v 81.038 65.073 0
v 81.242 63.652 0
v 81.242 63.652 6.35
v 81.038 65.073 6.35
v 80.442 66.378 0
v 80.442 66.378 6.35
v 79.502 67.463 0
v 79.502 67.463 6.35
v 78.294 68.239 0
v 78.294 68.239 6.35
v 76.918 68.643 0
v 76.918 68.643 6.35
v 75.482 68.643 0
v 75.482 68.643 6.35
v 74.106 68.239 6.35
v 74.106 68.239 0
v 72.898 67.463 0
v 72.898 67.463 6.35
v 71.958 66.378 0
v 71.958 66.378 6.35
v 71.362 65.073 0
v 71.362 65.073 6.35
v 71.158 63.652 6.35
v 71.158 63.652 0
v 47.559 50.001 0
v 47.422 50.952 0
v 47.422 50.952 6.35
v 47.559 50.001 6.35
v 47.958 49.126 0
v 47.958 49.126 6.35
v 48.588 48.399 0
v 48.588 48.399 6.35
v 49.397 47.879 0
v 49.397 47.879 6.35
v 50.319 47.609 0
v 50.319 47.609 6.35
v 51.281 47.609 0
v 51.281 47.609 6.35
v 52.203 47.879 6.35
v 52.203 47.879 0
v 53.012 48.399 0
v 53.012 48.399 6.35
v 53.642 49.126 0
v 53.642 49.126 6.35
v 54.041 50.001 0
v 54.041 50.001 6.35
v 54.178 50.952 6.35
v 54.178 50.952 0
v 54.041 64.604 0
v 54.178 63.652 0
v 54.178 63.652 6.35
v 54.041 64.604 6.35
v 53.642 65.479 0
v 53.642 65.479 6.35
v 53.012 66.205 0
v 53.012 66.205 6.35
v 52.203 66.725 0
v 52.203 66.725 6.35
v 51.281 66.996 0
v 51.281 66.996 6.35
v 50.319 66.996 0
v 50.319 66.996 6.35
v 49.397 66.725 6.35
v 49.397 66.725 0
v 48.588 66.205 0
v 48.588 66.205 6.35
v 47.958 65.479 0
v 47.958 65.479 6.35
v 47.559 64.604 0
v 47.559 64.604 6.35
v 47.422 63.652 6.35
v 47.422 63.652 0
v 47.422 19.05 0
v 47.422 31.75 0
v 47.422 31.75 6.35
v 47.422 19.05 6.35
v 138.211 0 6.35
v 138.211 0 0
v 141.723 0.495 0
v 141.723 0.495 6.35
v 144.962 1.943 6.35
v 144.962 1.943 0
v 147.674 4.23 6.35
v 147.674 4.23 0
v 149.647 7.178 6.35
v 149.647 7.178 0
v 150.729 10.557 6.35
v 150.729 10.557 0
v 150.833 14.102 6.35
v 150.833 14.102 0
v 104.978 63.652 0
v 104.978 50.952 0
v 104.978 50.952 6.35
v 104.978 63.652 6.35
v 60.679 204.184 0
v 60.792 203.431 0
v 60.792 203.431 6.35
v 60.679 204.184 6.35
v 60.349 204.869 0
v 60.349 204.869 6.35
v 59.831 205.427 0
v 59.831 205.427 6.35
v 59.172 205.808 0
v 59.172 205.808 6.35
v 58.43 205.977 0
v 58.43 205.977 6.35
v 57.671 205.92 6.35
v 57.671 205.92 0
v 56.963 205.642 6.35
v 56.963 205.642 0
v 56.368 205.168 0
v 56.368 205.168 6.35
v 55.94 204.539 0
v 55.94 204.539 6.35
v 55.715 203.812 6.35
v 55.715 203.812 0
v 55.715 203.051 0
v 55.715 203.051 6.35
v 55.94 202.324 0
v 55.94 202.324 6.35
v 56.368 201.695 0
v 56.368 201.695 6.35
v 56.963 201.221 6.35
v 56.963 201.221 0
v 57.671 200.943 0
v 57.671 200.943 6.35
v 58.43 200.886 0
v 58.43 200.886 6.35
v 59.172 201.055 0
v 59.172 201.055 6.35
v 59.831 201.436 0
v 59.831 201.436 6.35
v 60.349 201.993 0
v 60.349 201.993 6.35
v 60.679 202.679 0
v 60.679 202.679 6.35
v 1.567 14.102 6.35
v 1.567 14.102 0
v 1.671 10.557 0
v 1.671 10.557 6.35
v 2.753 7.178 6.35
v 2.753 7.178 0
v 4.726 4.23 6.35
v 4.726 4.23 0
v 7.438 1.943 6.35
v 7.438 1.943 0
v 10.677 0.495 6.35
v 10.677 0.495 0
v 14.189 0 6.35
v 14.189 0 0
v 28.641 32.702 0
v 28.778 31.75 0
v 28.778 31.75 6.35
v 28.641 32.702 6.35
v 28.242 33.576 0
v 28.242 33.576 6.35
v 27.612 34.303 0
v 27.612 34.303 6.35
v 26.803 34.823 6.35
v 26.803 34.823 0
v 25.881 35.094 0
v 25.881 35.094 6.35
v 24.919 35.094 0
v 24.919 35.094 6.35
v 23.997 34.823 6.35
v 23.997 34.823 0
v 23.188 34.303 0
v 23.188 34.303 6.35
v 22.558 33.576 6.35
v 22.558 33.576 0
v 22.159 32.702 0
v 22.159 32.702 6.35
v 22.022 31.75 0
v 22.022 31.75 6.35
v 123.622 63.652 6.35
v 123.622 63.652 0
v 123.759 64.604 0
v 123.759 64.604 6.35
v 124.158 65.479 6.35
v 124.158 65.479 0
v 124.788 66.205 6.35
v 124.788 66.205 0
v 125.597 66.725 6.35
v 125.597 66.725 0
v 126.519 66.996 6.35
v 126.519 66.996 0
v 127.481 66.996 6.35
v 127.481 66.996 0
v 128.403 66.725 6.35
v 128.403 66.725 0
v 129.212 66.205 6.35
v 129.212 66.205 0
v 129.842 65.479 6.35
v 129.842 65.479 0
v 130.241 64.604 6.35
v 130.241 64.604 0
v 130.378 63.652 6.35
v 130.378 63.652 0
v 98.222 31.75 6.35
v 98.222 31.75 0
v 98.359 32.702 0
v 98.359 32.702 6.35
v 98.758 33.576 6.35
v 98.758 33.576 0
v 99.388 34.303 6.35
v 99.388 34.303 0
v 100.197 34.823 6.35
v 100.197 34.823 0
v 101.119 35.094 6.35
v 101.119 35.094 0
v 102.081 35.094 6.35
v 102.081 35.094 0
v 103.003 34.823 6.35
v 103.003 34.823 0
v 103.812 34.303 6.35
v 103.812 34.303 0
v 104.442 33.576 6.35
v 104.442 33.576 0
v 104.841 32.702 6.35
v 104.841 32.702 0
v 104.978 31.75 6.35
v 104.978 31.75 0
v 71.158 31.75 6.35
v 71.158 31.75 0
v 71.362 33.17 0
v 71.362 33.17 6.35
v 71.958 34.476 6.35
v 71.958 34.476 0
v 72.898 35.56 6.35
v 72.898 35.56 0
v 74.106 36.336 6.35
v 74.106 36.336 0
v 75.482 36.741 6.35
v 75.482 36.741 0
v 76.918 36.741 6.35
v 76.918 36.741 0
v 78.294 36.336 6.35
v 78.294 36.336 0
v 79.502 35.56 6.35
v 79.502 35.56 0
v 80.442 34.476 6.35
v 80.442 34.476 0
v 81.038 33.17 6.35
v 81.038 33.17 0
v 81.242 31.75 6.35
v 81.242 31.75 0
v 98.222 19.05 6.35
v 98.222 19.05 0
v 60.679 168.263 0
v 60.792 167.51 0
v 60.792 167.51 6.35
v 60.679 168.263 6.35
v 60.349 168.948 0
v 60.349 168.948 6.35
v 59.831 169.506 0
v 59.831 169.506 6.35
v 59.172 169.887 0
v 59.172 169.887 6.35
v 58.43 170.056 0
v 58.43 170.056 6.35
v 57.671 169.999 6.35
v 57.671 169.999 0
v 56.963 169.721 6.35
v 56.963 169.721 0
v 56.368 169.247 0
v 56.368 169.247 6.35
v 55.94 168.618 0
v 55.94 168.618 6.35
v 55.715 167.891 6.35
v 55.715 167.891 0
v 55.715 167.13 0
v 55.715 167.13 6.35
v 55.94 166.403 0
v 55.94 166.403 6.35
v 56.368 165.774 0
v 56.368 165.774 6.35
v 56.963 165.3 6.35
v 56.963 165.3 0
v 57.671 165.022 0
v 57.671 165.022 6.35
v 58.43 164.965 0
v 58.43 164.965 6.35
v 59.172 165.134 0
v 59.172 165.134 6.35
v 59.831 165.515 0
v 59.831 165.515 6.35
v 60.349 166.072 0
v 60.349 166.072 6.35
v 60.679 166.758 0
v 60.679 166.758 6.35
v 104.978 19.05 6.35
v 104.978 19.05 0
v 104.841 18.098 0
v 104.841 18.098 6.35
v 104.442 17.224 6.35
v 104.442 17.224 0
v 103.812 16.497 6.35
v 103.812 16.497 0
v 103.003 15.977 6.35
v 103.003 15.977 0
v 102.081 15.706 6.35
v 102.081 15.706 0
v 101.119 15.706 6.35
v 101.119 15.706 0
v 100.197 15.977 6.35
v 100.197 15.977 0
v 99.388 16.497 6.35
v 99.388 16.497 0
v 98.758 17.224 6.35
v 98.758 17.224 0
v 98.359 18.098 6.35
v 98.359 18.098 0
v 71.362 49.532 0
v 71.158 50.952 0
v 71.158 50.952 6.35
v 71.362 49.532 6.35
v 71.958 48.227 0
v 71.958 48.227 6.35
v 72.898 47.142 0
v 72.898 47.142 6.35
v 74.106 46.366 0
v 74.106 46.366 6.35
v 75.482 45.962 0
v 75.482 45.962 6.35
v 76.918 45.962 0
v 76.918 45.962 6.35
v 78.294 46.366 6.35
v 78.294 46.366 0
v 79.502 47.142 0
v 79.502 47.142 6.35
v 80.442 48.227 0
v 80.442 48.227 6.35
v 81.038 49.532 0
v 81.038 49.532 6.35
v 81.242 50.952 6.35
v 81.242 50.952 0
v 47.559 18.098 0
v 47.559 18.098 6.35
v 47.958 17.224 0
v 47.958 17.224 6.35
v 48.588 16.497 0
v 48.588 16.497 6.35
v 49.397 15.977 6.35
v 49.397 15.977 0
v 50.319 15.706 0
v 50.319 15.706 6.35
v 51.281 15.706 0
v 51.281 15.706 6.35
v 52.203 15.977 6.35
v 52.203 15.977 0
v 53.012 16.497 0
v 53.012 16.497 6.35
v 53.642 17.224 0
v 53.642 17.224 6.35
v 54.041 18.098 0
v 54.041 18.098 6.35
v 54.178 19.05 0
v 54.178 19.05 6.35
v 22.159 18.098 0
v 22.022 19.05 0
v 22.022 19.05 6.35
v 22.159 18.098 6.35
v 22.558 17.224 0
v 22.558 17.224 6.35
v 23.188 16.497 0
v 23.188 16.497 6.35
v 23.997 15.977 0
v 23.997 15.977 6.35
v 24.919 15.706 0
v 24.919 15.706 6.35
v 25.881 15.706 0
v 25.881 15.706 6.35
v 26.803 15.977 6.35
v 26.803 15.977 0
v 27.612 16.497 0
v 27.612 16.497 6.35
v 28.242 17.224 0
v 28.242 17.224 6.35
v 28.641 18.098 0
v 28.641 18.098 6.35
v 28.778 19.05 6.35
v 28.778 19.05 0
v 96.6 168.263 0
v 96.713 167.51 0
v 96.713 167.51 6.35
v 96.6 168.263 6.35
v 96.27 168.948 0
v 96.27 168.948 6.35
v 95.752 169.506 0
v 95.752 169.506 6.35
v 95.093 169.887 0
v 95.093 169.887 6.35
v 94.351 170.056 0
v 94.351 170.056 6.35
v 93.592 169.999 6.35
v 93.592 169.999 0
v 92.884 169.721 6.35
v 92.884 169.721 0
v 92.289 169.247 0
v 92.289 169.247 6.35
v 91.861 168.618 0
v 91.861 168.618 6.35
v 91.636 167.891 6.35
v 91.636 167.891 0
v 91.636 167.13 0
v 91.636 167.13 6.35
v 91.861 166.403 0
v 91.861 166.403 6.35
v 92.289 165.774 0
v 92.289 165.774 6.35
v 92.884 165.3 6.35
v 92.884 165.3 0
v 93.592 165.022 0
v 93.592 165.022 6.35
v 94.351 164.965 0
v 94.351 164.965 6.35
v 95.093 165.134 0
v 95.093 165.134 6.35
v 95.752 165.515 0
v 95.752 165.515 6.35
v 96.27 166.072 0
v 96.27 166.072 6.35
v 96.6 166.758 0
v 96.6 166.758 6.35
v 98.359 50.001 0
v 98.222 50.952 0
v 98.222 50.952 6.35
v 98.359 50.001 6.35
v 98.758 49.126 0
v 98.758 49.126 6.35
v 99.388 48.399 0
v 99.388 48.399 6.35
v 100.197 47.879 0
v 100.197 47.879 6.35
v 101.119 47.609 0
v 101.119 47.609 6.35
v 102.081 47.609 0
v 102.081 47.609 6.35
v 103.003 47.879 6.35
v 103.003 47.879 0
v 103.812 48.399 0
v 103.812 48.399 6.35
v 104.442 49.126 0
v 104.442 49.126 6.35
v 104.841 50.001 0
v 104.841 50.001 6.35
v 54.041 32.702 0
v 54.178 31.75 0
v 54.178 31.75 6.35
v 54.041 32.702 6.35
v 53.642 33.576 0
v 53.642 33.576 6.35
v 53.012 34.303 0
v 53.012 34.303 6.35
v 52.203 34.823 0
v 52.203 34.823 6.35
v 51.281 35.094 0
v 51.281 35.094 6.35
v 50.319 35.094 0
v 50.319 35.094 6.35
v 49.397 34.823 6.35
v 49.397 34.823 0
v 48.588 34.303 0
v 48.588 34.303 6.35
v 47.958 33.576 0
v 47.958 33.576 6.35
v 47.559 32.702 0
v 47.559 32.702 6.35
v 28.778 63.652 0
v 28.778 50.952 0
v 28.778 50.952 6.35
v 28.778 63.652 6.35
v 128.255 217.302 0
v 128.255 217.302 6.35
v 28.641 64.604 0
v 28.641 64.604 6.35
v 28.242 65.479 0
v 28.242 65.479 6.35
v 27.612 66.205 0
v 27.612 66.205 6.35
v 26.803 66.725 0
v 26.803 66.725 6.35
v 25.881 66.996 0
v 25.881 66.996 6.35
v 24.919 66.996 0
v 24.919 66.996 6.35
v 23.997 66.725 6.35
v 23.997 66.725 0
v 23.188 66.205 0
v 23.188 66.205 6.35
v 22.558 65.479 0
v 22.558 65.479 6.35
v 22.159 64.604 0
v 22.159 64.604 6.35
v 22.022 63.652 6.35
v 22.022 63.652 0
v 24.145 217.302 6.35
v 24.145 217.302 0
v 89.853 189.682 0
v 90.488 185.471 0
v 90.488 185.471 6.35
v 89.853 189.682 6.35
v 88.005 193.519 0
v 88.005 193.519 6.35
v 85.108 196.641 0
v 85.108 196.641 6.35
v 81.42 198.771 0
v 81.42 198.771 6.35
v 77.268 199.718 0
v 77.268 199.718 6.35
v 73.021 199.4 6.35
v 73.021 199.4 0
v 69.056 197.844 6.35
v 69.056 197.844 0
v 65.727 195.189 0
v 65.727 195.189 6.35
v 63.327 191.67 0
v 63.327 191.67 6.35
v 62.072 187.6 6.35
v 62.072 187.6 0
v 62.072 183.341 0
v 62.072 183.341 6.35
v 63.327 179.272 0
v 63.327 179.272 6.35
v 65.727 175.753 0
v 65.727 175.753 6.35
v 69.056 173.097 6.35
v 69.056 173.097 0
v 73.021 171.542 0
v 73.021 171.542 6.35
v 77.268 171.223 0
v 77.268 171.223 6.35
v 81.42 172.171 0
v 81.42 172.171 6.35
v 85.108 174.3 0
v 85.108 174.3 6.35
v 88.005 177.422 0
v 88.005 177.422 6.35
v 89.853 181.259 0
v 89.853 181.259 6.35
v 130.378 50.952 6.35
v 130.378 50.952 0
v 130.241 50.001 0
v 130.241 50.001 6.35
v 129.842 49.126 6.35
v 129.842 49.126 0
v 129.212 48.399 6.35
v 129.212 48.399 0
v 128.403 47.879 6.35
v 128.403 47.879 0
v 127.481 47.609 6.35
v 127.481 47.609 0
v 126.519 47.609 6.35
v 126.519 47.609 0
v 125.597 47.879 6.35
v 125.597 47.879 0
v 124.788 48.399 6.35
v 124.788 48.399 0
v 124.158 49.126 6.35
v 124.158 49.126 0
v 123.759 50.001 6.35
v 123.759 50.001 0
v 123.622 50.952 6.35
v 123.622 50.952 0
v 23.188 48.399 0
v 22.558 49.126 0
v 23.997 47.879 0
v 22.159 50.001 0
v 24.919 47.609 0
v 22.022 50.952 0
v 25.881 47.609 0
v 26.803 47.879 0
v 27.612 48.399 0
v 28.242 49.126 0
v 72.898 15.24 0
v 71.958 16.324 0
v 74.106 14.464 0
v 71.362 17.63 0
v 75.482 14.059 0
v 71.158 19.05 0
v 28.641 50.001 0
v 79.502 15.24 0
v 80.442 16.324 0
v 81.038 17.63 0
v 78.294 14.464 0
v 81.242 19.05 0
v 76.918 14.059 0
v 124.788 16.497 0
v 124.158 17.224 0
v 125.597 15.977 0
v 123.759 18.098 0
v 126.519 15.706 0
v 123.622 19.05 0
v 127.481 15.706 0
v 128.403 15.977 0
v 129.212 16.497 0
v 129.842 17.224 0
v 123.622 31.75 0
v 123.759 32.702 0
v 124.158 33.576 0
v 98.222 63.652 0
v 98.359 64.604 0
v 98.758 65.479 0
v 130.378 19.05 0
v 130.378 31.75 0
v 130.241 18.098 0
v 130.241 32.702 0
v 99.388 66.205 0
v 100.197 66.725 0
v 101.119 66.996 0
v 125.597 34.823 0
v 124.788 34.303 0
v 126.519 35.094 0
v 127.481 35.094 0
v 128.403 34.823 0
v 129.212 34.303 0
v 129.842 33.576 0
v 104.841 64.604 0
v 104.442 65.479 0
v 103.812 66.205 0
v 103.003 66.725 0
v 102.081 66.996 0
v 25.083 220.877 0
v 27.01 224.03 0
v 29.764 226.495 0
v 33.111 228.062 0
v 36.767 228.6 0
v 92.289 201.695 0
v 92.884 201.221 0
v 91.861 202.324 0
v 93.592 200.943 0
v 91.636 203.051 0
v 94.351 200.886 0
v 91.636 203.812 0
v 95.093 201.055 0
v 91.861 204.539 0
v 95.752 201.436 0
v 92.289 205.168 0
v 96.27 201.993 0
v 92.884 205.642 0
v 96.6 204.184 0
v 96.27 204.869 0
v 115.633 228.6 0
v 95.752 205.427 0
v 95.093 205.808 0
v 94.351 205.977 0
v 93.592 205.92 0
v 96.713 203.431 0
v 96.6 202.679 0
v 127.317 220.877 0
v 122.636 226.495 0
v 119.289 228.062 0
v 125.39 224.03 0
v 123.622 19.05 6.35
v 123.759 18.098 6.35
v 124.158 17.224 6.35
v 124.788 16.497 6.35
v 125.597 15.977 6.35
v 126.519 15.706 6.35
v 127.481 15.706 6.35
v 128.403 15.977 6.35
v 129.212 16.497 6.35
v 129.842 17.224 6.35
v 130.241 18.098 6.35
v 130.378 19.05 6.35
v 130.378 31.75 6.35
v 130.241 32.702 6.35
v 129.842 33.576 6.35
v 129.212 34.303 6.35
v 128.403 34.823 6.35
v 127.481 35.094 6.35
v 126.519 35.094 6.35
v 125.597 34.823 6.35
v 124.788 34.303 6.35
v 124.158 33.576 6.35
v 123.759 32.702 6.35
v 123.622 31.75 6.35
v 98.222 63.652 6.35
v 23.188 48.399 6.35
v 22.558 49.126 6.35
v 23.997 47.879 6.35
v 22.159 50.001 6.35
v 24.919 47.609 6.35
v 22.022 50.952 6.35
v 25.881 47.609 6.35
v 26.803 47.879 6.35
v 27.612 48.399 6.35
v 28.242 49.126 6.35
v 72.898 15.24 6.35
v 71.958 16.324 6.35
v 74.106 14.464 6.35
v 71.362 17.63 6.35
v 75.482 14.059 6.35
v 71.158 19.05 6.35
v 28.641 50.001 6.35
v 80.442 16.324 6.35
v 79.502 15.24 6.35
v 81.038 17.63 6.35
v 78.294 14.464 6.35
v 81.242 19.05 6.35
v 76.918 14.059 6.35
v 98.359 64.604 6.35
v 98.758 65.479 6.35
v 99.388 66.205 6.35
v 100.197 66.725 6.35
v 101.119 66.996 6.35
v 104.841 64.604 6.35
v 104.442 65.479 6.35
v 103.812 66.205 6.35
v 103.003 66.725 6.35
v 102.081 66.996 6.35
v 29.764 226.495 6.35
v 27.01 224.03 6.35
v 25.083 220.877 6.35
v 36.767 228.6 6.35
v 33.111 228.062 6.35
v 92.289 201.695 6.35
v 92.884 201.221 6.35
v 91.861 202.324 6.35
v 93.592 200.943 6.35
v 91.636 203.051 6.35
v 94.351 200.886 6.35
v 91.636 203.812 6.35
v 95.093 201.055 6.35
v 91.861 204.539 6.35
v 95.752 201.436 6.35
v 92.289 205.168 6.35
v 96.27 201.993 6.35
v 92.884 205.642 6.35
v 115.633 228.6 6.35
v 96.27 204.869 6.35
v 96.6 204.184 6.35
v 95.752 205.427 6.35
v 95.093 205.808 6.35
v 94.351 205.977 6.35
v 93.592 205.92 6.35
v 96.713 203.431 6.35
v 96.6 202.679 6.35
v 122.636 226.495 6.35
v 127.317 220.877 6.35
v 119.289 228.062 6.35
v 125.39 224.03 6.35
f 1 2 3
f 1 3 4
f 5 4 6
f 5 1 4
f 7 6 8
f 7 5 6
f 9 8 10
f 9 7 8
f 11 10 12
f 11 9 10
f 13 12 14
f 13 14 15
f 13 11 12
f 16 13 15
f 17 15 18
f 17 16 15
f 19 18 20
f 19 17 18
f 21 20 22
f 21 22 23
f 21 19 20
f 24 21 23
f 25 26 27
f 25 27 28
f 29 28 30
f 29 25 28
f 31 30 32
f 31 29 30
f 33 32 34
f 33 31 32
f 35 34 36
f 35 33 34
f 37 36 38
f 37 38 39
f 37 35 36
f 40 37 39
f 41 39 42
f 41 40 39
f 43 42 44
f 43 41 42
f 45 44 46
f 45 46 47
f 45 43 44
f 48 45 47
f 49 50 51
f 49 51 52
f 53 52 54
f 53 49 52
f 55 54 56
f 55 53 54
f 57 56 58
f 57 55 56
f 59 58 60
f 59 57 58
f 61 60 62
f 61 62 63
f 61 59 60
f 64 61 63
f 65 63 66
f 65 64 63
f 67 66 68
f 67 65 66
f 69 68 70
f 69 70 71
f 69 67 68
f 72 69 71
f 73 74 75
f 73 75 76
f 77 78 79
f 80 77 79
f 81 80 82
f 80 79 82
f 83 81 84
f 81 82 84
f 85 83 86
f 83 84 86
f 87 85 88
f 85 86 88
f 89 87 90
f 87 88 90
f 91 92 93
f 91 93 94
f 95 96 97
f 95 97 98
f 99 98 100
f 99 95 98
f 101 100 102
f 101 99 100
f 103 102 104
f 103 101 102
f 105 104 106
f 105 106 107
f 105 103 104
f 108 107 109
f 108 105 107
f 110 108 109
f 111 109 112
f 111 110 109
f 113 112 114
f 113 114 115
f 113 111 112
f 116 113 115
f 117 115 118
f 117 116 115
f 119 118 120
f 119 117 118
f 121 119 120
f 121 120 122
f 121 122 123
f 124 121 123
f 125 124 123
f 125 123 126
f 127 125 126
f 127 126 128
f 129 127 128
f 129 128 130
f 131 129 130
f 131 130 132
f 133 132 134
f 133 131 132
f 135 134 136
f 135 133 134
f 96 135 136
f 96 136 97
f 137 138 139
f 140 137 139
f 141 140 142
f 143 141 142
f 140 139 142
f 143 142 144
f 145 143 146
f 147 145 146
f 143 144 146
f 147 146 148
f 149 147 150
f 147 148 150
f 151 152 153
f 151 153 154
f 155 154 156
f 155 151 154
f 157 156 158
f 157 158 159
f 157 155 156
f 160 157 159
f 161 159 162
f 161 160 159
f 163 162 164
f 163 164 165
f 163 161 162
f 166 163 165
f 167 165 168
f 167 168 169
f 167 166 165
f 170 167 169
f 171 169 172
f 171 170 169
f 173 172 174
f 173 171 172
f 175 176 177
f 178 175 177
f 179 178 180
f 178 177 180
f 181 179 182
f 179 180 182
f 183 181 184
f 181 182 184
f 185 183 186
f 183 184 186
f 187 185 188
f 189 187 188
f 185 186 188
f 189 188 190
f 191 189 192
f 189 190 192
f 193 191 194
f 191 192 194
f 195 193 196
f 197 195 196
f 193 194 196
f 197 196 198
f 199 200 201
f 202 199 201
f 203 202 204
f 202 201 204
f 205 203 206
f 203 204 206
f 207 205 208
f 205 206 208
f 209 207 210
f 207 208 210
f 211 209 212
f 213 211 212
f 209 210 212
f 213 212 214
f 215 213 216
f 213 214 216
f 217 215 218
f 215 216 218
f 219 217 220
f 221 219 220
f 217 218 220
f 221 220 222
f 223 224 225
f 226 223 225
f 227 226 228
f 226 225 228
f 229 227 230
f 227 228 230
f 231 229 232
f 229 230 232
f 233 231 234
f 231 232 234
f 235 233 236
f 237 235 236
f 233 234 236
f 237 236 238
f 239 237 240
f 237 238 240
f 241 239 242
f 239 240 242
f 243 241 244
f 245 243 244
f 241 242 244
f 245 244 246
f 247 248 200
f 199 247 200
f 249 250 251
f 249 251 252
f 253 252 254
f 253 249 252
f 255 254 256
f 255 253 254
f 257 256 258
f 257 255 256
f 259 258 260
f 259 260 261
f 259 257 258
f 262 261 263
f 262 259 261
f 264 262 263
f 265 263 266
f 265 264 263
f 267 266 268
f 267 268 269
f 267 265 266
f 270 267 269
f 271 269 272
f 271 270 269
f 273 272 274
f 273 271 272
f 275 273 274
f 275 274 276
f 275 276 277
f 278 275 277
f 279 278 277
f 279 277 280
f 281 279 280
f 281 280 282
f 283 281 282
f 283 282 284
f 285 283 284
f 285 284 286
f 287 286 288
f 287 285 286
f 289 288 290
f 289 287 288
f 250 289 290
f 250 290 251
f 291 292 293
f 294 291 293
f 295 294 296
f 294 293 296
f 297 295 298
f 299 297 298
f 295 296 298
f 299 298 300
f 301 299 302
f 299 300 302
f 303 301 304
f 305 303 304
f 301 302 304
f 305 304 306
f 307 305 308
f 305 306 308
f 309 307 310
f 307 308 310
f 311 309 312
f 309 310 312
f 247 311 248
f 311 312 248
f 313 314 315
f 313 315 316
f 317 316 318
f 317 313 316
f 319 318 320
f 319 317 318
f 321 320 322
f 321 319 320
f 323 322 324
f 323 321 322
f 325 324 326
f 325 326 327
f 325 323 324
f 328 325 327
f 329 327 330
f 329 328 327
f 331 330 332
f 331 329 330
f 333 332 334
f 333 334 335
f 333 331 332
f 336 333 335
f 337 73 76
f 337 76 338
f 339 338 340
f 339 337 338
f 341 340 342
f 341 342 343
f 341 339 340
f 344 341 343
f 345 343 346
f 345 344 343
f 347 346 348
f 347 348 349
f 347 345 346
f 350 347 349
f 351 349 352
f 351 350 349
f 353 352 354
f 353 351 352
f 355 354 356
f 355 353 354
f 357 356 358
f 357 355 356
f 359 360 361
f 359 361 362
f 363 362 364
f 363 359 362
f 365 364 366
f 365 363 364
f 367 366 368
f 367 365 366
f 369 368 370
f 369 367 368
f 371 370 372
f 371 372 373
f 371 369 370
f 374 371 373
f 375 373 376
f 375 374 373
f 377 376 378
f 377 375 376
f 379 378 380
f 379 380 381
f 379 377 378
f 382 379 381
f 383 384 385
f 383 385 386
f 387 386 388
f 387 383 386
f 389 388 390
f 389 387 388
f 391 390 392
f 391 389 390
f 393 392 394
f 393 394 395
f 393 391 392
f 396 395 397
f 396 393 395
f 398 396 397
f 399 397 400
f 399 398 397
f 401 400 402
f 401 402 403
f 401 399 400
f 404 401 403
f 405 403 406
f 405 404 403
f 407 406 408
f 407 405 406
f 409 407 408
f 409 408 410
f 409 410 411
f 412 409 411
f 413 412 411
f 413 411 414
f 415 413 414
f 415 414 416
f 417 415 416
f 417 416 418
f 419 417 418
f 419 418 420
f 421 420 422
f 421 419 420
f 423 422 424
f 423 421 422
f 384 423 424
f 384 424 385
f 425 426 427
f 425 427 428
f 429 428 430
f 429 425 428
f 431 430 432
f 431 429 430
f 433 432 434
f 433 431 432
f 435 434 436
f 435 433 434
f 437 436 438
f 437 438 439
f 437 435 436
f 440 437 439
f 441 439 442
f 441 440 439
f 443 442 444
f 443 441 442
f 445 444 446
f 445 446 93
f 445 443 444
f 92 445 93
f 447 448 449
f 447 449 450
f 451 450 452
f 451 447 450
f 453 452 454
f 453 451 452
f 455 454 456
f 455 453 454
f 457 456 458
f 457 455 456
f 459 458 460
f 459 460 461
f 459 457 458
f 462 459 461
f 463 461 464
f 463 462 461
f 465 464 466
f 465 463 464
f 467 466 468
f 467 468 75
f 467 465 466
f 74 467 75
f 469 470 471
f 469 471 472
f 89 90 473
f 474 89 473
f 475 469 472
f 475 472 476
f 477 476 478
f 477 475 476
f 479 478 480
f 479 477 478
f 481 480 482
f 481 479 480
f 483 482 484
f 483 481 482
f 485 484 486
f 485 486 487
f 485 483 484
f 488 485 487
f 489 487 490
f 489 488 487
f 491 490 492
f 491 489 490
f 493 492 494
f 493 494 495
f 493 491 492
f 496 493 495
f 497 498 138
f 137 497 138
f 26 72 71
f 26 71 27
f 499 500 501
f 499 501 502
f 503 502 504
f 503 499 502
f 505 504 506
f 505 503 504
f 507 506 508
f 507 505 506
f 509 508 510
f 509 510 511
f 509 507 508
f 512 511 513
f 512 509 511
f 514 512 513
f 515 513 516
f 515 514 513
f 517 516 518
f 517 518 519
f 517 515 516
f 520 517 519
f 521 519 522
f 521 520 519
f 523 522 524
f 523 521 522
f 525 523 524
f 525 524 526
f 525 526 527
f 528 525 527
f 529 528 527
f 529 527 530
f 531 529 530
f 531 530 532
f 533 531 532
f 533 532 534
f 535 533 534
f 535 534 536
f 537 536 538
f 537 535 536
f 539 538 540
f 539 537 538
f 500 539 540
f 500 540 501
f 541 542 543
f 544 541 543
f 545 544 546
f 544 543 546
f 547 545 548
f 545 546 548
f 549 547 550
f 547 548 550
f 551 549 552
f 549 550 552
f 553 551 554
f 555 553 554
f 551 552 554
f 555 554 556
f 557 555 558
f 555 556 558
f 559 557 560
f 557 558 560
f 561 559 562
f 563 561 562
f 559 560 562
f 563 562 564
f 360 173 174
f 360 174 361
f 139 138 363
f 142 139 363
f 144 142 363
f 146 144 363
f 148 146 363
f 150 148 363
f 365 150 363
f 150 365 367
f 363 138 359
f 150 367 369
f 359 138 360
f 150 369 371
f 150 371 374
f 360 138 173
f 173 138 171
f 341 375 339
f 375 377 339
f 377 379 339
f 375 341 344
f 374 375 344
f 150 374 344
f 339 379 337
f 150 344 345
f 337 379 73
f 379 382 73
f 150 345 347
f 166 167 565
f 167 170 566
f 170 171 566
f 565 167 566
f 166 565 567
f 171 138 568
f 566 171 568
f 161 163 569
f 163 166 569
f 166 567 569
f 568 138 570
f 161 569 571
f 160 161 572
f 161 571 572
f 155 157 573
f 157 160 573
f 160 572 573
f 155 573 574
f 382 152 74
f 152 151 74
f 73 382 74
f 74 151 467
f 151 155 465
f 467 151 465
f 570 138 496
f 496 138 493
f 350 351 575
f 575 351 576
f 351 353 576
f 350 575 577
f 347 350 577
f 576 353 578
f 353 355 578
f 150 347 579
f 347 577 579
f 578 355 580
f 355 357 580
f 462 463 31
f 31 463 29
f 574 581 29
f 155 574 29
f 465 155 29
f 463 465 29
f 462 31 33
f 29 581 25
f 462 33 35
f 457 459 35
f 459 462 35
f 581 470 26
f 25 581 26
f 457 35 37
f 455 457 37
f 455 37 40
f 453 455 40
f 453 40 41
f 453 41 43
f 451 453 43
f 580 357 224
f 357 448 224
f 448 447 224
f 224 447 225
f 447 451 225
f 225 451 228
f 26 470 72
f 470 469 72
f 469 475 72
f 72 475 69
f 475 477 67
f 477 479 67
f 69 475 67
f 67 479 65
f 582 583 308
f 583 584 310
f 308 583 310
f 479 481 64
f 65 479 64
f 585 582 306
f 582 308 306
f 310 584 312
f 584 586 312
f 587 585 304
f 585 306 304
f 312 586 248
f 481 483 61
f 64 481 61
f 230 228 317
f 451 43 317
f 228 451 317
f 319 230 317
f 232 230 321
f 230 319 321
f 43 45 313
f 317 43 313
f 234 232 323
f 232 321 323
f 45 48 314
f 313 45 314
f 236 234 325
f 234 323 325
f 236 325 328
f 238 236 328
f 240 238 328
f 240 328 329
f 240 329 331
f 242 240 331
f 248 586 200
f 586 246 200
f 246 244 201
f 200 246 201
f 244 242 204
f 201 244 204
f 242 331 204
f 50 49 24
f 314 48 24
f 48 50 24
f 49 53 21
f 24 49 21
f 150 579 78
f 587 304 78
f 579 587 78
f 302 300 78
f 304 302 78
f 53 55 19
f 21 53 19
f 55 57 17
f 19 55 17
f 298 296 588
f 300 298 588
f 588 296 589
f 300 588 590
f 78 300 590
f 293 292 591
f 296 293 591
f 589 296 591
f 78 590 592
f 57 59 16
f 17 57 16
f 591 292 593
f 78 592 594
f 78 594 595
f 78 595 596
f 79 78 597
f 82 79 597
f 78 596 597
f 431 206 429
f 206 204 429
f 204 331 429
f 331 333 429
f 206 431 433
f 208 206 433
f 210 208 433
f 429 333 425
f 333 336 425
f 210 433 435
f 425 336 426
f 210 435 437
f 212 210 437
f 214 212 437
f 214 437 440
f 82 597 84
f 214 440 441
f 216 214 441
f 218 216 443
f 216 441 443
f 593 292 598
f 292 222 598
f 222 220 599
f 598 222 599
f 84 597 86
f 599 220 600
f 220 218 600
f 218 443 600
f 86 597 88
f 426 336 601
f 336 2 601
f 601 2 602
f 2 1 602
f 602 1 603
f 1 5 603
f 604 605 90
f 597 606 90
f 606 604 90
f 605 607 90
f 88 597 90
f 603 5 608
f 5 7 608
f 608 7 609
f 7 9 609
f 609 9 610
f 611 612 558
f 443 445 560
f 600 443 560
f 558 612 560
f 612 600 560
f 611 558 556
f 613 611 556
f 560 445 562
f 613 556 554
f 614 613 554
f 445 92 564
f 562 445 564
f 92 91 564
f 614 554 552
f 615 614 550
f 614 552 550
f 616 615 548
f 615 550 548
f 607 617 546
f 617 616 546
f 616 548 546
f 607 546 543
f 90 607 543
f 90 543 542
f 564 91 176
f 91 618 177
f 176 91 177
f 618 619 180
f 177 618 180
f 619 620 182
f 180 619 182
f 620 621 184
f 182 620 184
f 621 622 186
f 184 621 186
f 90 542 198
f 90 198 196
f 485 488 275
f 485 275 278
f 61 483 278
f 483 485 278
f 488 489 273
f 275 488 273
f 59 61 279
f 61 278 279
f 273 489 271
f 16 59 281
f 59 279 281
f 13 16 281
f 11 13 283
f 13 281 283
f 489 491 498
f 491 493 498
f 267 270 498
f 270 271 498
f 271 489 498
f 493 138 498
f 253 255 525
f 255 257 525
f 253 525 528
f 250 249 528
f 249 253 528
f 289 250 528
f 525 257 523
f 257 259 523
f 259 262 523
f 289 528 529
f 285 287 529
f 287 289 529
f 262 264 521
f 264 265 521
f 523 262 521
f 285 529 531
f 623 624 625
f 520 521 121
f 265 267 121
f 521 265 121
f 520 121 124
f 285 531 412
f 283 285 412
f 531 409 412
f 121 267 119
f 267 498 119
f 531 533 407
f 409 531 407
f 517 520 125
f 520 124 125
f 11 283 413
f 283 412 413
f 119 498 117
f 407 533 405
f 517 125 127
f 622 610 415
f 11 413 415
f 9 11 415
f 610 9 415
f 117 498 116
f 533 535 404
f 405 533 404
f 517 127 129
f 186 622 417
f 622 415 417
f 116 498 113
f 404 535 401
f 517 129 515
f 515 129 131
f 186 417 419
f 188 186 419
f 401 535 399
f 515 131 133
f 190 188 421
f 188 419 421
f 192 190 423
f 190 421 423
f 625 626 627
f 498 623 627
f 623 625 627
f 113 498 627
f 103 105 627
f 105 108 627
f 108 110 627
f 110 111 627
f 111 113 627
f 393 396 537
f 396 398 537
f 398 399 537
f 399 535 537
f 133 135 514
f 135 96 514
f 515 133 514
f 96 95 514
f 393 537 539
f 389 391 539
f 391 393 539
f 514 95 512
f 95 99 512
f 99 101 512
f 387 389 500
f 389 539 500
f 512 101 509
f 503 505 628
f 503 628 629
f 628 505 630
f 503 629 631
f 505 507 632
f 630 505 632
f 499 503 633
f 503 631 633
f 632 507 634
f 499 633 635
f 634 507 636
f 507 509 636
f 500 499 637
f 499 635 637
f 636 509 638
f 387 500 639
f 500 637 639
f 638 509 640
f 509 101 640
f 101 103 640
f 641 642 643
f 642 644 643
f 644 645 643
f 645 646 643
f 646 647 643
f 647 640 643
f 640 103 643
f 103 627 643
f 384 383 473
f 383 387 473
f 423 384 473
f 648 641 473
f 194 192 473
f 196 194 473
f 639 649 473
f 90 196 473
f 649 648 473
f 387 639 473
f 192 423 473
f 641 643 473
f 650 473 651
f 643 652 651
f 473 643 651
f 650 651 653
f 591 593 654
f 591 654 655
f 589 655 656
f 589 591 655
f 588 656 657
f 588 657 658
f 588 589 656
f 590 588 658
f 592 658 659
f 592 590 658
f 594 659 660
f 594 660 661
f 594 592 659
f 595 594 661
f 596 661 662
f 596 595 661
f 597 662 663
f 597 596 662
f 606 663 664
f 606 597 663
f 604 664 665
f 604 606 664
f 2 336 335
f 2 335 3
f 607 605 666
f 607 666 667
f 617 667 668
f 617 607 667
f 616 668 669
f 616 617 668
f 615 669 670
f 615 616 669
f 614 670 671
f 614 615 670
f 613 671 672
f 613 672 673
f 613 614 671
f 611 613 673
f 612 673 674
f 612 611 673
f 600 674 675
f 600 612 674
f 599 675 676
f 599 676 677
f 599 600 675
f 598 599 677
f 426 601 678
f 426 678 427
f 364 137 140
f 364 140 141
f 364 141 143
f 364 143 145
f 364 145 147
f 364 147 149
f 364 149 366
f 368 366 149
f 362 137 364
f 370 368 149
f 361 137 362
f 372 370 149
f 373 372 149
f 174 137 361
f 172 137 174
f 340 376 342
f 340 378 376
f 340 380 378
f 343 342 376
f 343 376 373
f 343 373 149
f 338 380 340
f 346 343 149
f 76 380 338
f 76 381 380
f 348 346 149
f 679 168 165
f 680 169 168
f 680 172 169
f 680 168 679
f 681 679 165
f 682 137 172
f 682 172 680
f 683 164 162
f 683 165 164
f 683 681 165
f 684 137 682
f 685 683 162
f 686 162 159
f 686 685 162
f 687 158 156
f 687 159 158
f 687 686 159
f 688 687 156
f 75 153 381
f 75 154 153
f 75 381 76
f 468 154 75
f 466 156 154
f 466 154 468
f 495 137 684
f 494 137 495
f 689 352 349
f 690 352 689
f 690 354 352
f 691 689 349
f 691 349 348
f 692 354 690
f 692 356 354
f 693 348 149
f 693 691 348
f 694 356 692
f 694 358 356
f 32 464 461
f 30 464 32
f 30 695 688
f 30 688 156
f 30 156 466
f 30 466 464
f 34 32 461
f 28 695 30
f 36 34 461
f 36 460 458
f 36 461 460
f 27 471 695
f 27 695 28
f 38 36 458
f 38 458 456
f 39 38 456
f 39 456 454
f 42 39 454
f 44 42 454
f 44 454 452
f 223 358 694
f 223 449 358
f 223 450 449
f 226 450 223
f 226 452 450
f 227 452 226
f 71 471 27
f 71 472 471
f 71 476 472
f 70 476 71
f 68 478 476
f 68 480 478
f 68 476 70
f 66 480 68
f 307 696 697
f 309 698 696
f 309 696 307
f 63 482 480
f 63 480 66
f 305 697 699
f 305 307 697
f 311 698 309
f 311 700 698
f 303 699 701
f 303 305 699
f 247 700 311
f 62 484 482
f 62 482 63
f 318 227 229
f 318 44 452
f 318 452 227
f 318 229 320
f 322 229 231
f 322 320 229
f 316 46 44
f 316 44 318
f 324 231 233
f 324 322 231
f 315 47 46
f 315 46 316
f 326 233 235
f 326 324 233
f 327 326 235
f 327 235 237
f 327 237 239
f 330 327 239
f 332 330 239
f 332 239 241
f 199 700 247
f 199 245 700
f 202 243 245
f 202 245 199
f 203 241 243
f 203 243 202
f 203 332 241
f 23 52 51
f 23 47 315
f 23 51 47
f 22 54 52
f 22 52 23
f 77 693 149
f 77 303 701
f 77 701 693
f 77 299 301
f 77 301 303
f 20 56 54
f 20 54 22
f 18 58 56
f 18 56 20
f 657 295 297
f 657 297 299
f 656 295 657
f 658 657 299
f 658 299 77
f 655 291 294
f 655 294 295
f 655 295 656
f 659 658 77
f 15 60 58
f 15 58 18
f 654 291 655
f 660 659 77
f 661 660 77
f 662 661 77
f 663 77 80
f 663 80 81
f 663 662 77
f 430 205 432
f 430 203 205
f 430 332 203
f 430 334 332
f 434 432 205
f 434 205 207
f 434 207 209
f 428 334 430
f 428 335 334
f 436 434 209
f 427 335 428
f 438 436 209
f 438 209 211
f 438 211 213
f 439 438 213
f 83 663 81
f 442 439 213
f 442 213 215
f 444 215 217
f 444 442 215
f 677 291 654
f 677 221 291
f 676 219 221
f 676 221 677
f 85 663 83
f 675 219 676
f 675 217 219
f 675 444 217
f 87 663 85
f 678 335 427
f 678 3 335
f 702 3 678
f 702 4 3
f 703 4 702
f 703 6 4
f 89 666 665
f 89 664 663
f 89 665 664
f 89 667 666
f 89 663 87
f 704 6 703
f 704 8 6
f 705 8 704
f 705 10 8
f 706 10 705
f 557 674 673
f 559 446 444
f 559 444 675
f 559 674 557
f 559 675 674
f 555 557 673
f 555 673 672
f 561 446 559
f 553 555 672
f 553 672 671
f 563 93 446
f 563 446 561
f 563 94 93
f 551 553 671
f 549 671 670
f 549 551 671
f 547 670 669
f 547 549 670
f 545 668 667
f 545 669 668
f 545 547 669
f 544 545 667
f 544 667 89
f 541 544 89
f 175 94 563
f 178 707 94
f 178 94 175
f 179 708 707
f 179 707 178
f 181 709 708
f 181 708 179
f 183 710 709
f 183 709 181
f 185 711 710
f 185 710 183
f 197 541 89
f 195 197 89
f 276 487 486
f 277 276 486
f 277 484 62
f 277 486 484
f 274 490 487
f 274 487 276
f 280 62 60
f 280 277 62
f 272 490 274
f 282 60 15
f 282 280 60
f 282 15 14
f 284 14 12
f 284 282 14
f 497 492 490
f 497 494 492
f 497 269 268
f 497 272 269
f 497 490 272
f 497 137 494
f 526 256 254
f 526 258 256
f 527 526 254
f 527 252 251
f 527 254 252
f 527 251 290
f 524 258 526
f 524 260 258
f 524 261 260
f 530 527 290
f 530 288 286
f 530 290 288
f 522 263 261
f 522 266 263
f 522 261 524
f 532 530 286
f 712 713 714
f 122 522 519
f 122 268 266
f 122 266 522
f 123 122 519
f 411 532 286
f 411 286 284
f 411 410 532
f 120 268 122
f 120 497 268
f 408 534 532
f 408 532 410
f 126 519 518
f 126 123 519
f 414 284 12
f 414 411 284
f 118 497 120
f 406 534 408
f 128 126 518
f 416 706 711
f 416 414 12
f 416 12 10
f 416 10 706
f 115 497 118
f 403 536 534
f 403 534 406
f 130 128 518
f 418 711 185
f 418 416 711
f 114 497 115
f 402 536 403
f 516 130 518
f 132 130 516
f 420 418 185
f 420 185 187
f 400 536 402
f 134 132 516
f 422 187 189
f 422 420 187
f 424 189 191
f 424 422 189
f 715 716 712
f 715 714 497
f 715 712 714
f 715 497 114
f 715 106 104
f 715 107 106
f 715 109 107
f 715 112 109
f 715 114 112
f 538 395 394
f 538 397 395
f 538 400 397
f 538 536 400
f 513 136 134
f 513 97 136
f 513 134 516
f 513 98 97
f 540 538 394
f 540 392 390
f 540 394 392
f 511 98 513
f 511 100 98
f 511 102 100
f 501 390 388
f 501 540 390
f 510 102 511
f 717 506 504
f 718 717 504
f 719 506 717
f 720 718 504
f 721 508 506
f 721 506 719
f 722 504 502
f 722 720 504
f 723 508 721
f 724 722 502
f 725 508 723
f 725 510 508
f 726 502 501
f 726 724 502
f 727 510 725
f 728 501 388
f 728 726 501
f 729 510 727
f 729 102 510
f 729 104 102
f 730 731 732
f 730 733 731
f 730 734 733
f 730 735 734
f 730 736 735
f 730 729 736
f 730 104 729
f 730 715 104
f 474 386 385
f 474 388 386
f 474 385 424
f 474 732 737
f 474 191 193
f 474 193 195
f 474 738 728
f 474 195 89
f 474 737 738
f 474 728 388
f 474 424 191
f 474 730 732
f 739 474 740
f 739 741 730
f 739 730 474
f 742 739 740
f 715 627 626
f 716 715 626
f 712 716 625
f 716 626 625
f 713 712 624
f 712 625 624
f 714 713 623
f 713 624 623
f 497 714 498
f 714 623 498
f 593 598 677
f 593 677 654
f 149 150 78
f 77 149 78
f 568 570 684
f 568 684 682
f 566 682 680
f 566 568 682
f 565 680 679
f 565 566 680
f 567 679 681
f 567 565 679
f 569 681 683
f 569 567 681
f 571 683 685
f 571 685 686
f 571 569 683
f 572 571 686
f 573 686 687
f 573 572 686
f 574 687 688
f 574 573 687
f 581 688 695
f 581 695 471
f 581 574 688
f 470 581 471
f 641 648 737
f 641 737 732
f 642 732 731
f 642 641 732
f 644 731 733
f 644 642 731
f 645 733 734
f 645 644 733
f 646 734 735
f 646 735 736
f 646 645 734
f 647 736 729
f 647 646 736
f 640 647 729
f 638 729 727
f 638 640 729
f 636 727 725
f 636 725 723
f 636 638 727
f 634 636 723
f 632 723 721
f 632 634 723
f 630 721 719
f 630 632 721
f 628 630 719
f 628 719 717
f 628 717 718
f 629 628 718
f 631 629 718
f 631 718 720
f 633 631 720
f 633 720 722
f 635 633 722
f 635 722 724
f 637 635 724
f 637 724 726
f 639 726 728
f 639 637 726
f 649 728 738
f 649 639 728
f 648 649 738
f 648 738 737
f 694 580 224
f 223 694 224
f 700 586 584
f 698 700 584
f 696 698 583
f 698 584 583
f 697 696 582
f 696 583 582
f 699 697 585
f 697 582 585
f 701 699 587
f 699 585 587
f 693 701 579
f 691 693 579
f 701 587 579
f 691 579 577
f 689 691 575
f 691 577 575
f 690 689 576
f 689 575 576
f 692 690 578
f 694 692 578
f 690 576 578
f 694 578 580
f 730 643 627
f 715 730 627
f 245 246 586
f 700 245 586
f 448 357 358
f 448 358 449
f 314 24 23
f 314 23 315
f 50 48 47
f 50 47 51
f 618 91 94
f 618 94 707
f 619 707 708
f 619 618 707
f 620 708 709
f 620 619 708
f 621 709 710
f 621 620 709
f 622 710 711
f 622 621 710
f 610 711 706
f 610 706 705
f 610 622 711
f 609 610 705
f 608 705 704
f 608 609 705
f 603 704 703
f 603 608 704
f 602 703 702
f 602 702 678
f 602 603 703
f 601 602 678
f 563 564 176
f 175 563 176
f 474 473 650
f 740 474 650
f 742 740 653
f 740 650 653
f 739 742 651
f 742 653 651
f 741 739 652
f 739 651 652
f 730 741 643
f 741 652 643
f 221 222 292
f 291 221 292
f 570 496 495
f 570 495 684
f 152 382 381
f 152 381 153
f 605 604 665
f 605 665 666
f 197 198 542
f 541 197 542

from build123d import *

# Parameters (mm, degrees)
SKETCH1_R           = 14.2875
SKETCH1_R_2         = 2.5527
BOSS_EXTRUDE1_DEPTH = 6.35


with BuildPart() as part:
    # Sketch1 → Boss-Extrude1 (new body)
    with BuildSketch(Plane.XY):
        with BuildLine():
            Line((14.189265695, 0), (138.210734305, 0))
            ThreePointArc((138.210734305, 0), (147.673860132, 4.230097428), (150.833057735, 14.102480381))
            Line((150.833057735, 14.102480381), (128.255279958, 217.302480381))
            ThreePointArc((128.255279958, 217.302480381), (124.102859099, 225.363125827), (115.632956527, 228.6))
            Line((115.632956527, 228.6), (36.767043473, 228.6))
            ThreePointArc((36.767043473, 228.6), (28.297140901, 225.363125827), (24.144720042, 217.302480381))
            Line((24.144720042, 217.302480381), (1.566942265, 14.102480381))
            ThreePointArc((1.566942265, 14.102480381), (4.726139868, 4.230097428), (14.189265695, 0))
        make_face()
        with Locations((76.2, 185.4708)):
            Circle(SKETCH1_R, mode=Mode.SUBTRACT)
        with Locations((94.160512242, 203.431312242)):
            Circle(SKETCH1_R_2, mode=Mode.SUBTRACT)
        with Locations((94.160512242, 167.510287758)):
            Circle(SKETCH1_R_2, mode=Mode.SUBTRACT)
        with Locations((58.239487758, 167.510287758)):
            Circle(SKETCH1_R_2, mode=Mode.SUBTRACT)
        with Locations((58.239487758, 203.431312242)):
            Circle(SKETCH1_R_2, mode=Mode.SUBTRACT)
        with BuildLine():
            Line((98.2218, 19.05), (98.2218, 31.75))
            ThreePointArc((98.2218, 31.75), (101.6, 35.1282), (104.9782, 31.75))
            Line((104.9782, 31.75), (104.9782, 19.05))
            ThreePointArc((104.9782, 19.05), (101.6, 15.6718), (98.2218, 19.05))
        make_face(mode=Mode.SUBTRACT)
        with BuildLine():
            Line((71.1581, 19.05), (71.1581, 31.75))
            ThreePointArc((71.1581, 31.75), (76.2, 36.7919), (81.2419, 31.75))
            Line((81.2419, 31.75), (81.2419, 19.05))
            ThreePointArc((81.2419, 19.05), (76.2, 14.0081), (71.1581, 19.05))
        make_face(mode=Mode.SUBTRACT)
        with BuildLine():
            Line((130.3782, 19.05), (130.3782, 31.75))
            ThreePointArc((130.3782, 31.75), (127, 35.1282), (123.6218, 31.75))
            Line((123.6218, 31.75), (123.6218, 19.05))
            ThreePointArc((123.6218, 19.05), (127, 15.6718), (130.3782, 19.05))
        make_face(mode=Mode.SUBTRACT)
        with BuildLine():
            Line((54.1782, 19.05), (54.1782, 31.75))
            ThreePointArc((54.1782, 31.75), (50.8, 35.1282), (47.4218, 31.75))
            Line((47.4218, 31.75), (47.4218, 19.05))
            ThreePointArc((47.4218, 19.05), (50.8, 15.6718), (54.1782, 19.05))
        make_face(mode=Mode.SUBTRACT)
        with BuildLine():
            Line((28.7782, 19.05), (28.7782, 31.75))
            ThreePointArc((28.7782, 31.75), (25.4, 35.1282), (22.0218, 31.75))
            Line((22.0218, 31.75), (22.0218, 19.05))
            ThreePointArc((22.0218, 19.05), (25.4, 15.6718), (28.7782, 19.05))
        make_face(mode=Mode.SUBTRACT)
        with BuildLine():
            Line((28.7782, 50.9524), (28.7782, 63.6524))
            ThreePointArc((28.7782, 63.6524), (25.4, 67.0306), (22.0218, 63.6524))
            Line((22.0218, 63.6524), (22.0218, 50.9524))
            ThreePointArc((22.0218, 50.9524), (25.4, 47.5742), (28.7782, 50.9524))
        make_face(mode=Mode.SUBTRACT)
        with BuildLine():
            Line((54.1782, 50.9524), (54.1782, 63.6524))
            ThreePointArc((54.1782, 63.6524), (50.8, 67.0306), (47.4218, 63.6524))
            Line((47.4218, 63.6524), (47.4218, 50.9524))
            ThreePointArc((47.4218, 50.9524), (50.8, 47.5742), (54.1782, 50.9524))
        make_face(mode=Mode.SUBTRACT)
        with BuildLine():
            Line((81.2419, 50.9524), (81.2419, 63.6524))
            ThreePointArc((81.2419, 63.6524), (76.2, 68.6943), (71.1581, 63.6524))
            Line((71.1581, 63.6524), (71.1581, 50.9524))
            ThreePointArc((71.1581, 50.9524), (76.2, 45.9105), (81.2419, 50.9524))
        make_face(mode=Mode.SUBTRACT)
        with BuildLine():
            Line((104.9782, 50.9524), (104.9782, 63.6524))
            ThreePointArc((104.9782, 63.6524), (101.6, 67.0306), (98.2218, 63.6524))
            Line((98.2218, 63.6524), (98.2218, 50.9524))
            ThreePointArc((98.2218, 50.9524), (101.6, 47.5742), (104.9782, 50.9524))
        make_face(mode=Mode.SUBTRACT)
        with BuildLine():
            Line((123.6218, 50.9524), (123.6218, 63.6524))
            ThreePointArc((123.6218, 63.6524), (127, 67.0306), (130.3782, 63.6524))
            Line((130.3782, 63.6524), (130.3782, 50.9524))
            ThreePointArc((130.3782, 50.9524), (127, 47.5742), (123.6218, 50.9524))
        make_face(mode=Mode.SUBTRACT)
    extrude(amount=BOSS_EXTRUDE1_DEPTH)


solid = part.part
